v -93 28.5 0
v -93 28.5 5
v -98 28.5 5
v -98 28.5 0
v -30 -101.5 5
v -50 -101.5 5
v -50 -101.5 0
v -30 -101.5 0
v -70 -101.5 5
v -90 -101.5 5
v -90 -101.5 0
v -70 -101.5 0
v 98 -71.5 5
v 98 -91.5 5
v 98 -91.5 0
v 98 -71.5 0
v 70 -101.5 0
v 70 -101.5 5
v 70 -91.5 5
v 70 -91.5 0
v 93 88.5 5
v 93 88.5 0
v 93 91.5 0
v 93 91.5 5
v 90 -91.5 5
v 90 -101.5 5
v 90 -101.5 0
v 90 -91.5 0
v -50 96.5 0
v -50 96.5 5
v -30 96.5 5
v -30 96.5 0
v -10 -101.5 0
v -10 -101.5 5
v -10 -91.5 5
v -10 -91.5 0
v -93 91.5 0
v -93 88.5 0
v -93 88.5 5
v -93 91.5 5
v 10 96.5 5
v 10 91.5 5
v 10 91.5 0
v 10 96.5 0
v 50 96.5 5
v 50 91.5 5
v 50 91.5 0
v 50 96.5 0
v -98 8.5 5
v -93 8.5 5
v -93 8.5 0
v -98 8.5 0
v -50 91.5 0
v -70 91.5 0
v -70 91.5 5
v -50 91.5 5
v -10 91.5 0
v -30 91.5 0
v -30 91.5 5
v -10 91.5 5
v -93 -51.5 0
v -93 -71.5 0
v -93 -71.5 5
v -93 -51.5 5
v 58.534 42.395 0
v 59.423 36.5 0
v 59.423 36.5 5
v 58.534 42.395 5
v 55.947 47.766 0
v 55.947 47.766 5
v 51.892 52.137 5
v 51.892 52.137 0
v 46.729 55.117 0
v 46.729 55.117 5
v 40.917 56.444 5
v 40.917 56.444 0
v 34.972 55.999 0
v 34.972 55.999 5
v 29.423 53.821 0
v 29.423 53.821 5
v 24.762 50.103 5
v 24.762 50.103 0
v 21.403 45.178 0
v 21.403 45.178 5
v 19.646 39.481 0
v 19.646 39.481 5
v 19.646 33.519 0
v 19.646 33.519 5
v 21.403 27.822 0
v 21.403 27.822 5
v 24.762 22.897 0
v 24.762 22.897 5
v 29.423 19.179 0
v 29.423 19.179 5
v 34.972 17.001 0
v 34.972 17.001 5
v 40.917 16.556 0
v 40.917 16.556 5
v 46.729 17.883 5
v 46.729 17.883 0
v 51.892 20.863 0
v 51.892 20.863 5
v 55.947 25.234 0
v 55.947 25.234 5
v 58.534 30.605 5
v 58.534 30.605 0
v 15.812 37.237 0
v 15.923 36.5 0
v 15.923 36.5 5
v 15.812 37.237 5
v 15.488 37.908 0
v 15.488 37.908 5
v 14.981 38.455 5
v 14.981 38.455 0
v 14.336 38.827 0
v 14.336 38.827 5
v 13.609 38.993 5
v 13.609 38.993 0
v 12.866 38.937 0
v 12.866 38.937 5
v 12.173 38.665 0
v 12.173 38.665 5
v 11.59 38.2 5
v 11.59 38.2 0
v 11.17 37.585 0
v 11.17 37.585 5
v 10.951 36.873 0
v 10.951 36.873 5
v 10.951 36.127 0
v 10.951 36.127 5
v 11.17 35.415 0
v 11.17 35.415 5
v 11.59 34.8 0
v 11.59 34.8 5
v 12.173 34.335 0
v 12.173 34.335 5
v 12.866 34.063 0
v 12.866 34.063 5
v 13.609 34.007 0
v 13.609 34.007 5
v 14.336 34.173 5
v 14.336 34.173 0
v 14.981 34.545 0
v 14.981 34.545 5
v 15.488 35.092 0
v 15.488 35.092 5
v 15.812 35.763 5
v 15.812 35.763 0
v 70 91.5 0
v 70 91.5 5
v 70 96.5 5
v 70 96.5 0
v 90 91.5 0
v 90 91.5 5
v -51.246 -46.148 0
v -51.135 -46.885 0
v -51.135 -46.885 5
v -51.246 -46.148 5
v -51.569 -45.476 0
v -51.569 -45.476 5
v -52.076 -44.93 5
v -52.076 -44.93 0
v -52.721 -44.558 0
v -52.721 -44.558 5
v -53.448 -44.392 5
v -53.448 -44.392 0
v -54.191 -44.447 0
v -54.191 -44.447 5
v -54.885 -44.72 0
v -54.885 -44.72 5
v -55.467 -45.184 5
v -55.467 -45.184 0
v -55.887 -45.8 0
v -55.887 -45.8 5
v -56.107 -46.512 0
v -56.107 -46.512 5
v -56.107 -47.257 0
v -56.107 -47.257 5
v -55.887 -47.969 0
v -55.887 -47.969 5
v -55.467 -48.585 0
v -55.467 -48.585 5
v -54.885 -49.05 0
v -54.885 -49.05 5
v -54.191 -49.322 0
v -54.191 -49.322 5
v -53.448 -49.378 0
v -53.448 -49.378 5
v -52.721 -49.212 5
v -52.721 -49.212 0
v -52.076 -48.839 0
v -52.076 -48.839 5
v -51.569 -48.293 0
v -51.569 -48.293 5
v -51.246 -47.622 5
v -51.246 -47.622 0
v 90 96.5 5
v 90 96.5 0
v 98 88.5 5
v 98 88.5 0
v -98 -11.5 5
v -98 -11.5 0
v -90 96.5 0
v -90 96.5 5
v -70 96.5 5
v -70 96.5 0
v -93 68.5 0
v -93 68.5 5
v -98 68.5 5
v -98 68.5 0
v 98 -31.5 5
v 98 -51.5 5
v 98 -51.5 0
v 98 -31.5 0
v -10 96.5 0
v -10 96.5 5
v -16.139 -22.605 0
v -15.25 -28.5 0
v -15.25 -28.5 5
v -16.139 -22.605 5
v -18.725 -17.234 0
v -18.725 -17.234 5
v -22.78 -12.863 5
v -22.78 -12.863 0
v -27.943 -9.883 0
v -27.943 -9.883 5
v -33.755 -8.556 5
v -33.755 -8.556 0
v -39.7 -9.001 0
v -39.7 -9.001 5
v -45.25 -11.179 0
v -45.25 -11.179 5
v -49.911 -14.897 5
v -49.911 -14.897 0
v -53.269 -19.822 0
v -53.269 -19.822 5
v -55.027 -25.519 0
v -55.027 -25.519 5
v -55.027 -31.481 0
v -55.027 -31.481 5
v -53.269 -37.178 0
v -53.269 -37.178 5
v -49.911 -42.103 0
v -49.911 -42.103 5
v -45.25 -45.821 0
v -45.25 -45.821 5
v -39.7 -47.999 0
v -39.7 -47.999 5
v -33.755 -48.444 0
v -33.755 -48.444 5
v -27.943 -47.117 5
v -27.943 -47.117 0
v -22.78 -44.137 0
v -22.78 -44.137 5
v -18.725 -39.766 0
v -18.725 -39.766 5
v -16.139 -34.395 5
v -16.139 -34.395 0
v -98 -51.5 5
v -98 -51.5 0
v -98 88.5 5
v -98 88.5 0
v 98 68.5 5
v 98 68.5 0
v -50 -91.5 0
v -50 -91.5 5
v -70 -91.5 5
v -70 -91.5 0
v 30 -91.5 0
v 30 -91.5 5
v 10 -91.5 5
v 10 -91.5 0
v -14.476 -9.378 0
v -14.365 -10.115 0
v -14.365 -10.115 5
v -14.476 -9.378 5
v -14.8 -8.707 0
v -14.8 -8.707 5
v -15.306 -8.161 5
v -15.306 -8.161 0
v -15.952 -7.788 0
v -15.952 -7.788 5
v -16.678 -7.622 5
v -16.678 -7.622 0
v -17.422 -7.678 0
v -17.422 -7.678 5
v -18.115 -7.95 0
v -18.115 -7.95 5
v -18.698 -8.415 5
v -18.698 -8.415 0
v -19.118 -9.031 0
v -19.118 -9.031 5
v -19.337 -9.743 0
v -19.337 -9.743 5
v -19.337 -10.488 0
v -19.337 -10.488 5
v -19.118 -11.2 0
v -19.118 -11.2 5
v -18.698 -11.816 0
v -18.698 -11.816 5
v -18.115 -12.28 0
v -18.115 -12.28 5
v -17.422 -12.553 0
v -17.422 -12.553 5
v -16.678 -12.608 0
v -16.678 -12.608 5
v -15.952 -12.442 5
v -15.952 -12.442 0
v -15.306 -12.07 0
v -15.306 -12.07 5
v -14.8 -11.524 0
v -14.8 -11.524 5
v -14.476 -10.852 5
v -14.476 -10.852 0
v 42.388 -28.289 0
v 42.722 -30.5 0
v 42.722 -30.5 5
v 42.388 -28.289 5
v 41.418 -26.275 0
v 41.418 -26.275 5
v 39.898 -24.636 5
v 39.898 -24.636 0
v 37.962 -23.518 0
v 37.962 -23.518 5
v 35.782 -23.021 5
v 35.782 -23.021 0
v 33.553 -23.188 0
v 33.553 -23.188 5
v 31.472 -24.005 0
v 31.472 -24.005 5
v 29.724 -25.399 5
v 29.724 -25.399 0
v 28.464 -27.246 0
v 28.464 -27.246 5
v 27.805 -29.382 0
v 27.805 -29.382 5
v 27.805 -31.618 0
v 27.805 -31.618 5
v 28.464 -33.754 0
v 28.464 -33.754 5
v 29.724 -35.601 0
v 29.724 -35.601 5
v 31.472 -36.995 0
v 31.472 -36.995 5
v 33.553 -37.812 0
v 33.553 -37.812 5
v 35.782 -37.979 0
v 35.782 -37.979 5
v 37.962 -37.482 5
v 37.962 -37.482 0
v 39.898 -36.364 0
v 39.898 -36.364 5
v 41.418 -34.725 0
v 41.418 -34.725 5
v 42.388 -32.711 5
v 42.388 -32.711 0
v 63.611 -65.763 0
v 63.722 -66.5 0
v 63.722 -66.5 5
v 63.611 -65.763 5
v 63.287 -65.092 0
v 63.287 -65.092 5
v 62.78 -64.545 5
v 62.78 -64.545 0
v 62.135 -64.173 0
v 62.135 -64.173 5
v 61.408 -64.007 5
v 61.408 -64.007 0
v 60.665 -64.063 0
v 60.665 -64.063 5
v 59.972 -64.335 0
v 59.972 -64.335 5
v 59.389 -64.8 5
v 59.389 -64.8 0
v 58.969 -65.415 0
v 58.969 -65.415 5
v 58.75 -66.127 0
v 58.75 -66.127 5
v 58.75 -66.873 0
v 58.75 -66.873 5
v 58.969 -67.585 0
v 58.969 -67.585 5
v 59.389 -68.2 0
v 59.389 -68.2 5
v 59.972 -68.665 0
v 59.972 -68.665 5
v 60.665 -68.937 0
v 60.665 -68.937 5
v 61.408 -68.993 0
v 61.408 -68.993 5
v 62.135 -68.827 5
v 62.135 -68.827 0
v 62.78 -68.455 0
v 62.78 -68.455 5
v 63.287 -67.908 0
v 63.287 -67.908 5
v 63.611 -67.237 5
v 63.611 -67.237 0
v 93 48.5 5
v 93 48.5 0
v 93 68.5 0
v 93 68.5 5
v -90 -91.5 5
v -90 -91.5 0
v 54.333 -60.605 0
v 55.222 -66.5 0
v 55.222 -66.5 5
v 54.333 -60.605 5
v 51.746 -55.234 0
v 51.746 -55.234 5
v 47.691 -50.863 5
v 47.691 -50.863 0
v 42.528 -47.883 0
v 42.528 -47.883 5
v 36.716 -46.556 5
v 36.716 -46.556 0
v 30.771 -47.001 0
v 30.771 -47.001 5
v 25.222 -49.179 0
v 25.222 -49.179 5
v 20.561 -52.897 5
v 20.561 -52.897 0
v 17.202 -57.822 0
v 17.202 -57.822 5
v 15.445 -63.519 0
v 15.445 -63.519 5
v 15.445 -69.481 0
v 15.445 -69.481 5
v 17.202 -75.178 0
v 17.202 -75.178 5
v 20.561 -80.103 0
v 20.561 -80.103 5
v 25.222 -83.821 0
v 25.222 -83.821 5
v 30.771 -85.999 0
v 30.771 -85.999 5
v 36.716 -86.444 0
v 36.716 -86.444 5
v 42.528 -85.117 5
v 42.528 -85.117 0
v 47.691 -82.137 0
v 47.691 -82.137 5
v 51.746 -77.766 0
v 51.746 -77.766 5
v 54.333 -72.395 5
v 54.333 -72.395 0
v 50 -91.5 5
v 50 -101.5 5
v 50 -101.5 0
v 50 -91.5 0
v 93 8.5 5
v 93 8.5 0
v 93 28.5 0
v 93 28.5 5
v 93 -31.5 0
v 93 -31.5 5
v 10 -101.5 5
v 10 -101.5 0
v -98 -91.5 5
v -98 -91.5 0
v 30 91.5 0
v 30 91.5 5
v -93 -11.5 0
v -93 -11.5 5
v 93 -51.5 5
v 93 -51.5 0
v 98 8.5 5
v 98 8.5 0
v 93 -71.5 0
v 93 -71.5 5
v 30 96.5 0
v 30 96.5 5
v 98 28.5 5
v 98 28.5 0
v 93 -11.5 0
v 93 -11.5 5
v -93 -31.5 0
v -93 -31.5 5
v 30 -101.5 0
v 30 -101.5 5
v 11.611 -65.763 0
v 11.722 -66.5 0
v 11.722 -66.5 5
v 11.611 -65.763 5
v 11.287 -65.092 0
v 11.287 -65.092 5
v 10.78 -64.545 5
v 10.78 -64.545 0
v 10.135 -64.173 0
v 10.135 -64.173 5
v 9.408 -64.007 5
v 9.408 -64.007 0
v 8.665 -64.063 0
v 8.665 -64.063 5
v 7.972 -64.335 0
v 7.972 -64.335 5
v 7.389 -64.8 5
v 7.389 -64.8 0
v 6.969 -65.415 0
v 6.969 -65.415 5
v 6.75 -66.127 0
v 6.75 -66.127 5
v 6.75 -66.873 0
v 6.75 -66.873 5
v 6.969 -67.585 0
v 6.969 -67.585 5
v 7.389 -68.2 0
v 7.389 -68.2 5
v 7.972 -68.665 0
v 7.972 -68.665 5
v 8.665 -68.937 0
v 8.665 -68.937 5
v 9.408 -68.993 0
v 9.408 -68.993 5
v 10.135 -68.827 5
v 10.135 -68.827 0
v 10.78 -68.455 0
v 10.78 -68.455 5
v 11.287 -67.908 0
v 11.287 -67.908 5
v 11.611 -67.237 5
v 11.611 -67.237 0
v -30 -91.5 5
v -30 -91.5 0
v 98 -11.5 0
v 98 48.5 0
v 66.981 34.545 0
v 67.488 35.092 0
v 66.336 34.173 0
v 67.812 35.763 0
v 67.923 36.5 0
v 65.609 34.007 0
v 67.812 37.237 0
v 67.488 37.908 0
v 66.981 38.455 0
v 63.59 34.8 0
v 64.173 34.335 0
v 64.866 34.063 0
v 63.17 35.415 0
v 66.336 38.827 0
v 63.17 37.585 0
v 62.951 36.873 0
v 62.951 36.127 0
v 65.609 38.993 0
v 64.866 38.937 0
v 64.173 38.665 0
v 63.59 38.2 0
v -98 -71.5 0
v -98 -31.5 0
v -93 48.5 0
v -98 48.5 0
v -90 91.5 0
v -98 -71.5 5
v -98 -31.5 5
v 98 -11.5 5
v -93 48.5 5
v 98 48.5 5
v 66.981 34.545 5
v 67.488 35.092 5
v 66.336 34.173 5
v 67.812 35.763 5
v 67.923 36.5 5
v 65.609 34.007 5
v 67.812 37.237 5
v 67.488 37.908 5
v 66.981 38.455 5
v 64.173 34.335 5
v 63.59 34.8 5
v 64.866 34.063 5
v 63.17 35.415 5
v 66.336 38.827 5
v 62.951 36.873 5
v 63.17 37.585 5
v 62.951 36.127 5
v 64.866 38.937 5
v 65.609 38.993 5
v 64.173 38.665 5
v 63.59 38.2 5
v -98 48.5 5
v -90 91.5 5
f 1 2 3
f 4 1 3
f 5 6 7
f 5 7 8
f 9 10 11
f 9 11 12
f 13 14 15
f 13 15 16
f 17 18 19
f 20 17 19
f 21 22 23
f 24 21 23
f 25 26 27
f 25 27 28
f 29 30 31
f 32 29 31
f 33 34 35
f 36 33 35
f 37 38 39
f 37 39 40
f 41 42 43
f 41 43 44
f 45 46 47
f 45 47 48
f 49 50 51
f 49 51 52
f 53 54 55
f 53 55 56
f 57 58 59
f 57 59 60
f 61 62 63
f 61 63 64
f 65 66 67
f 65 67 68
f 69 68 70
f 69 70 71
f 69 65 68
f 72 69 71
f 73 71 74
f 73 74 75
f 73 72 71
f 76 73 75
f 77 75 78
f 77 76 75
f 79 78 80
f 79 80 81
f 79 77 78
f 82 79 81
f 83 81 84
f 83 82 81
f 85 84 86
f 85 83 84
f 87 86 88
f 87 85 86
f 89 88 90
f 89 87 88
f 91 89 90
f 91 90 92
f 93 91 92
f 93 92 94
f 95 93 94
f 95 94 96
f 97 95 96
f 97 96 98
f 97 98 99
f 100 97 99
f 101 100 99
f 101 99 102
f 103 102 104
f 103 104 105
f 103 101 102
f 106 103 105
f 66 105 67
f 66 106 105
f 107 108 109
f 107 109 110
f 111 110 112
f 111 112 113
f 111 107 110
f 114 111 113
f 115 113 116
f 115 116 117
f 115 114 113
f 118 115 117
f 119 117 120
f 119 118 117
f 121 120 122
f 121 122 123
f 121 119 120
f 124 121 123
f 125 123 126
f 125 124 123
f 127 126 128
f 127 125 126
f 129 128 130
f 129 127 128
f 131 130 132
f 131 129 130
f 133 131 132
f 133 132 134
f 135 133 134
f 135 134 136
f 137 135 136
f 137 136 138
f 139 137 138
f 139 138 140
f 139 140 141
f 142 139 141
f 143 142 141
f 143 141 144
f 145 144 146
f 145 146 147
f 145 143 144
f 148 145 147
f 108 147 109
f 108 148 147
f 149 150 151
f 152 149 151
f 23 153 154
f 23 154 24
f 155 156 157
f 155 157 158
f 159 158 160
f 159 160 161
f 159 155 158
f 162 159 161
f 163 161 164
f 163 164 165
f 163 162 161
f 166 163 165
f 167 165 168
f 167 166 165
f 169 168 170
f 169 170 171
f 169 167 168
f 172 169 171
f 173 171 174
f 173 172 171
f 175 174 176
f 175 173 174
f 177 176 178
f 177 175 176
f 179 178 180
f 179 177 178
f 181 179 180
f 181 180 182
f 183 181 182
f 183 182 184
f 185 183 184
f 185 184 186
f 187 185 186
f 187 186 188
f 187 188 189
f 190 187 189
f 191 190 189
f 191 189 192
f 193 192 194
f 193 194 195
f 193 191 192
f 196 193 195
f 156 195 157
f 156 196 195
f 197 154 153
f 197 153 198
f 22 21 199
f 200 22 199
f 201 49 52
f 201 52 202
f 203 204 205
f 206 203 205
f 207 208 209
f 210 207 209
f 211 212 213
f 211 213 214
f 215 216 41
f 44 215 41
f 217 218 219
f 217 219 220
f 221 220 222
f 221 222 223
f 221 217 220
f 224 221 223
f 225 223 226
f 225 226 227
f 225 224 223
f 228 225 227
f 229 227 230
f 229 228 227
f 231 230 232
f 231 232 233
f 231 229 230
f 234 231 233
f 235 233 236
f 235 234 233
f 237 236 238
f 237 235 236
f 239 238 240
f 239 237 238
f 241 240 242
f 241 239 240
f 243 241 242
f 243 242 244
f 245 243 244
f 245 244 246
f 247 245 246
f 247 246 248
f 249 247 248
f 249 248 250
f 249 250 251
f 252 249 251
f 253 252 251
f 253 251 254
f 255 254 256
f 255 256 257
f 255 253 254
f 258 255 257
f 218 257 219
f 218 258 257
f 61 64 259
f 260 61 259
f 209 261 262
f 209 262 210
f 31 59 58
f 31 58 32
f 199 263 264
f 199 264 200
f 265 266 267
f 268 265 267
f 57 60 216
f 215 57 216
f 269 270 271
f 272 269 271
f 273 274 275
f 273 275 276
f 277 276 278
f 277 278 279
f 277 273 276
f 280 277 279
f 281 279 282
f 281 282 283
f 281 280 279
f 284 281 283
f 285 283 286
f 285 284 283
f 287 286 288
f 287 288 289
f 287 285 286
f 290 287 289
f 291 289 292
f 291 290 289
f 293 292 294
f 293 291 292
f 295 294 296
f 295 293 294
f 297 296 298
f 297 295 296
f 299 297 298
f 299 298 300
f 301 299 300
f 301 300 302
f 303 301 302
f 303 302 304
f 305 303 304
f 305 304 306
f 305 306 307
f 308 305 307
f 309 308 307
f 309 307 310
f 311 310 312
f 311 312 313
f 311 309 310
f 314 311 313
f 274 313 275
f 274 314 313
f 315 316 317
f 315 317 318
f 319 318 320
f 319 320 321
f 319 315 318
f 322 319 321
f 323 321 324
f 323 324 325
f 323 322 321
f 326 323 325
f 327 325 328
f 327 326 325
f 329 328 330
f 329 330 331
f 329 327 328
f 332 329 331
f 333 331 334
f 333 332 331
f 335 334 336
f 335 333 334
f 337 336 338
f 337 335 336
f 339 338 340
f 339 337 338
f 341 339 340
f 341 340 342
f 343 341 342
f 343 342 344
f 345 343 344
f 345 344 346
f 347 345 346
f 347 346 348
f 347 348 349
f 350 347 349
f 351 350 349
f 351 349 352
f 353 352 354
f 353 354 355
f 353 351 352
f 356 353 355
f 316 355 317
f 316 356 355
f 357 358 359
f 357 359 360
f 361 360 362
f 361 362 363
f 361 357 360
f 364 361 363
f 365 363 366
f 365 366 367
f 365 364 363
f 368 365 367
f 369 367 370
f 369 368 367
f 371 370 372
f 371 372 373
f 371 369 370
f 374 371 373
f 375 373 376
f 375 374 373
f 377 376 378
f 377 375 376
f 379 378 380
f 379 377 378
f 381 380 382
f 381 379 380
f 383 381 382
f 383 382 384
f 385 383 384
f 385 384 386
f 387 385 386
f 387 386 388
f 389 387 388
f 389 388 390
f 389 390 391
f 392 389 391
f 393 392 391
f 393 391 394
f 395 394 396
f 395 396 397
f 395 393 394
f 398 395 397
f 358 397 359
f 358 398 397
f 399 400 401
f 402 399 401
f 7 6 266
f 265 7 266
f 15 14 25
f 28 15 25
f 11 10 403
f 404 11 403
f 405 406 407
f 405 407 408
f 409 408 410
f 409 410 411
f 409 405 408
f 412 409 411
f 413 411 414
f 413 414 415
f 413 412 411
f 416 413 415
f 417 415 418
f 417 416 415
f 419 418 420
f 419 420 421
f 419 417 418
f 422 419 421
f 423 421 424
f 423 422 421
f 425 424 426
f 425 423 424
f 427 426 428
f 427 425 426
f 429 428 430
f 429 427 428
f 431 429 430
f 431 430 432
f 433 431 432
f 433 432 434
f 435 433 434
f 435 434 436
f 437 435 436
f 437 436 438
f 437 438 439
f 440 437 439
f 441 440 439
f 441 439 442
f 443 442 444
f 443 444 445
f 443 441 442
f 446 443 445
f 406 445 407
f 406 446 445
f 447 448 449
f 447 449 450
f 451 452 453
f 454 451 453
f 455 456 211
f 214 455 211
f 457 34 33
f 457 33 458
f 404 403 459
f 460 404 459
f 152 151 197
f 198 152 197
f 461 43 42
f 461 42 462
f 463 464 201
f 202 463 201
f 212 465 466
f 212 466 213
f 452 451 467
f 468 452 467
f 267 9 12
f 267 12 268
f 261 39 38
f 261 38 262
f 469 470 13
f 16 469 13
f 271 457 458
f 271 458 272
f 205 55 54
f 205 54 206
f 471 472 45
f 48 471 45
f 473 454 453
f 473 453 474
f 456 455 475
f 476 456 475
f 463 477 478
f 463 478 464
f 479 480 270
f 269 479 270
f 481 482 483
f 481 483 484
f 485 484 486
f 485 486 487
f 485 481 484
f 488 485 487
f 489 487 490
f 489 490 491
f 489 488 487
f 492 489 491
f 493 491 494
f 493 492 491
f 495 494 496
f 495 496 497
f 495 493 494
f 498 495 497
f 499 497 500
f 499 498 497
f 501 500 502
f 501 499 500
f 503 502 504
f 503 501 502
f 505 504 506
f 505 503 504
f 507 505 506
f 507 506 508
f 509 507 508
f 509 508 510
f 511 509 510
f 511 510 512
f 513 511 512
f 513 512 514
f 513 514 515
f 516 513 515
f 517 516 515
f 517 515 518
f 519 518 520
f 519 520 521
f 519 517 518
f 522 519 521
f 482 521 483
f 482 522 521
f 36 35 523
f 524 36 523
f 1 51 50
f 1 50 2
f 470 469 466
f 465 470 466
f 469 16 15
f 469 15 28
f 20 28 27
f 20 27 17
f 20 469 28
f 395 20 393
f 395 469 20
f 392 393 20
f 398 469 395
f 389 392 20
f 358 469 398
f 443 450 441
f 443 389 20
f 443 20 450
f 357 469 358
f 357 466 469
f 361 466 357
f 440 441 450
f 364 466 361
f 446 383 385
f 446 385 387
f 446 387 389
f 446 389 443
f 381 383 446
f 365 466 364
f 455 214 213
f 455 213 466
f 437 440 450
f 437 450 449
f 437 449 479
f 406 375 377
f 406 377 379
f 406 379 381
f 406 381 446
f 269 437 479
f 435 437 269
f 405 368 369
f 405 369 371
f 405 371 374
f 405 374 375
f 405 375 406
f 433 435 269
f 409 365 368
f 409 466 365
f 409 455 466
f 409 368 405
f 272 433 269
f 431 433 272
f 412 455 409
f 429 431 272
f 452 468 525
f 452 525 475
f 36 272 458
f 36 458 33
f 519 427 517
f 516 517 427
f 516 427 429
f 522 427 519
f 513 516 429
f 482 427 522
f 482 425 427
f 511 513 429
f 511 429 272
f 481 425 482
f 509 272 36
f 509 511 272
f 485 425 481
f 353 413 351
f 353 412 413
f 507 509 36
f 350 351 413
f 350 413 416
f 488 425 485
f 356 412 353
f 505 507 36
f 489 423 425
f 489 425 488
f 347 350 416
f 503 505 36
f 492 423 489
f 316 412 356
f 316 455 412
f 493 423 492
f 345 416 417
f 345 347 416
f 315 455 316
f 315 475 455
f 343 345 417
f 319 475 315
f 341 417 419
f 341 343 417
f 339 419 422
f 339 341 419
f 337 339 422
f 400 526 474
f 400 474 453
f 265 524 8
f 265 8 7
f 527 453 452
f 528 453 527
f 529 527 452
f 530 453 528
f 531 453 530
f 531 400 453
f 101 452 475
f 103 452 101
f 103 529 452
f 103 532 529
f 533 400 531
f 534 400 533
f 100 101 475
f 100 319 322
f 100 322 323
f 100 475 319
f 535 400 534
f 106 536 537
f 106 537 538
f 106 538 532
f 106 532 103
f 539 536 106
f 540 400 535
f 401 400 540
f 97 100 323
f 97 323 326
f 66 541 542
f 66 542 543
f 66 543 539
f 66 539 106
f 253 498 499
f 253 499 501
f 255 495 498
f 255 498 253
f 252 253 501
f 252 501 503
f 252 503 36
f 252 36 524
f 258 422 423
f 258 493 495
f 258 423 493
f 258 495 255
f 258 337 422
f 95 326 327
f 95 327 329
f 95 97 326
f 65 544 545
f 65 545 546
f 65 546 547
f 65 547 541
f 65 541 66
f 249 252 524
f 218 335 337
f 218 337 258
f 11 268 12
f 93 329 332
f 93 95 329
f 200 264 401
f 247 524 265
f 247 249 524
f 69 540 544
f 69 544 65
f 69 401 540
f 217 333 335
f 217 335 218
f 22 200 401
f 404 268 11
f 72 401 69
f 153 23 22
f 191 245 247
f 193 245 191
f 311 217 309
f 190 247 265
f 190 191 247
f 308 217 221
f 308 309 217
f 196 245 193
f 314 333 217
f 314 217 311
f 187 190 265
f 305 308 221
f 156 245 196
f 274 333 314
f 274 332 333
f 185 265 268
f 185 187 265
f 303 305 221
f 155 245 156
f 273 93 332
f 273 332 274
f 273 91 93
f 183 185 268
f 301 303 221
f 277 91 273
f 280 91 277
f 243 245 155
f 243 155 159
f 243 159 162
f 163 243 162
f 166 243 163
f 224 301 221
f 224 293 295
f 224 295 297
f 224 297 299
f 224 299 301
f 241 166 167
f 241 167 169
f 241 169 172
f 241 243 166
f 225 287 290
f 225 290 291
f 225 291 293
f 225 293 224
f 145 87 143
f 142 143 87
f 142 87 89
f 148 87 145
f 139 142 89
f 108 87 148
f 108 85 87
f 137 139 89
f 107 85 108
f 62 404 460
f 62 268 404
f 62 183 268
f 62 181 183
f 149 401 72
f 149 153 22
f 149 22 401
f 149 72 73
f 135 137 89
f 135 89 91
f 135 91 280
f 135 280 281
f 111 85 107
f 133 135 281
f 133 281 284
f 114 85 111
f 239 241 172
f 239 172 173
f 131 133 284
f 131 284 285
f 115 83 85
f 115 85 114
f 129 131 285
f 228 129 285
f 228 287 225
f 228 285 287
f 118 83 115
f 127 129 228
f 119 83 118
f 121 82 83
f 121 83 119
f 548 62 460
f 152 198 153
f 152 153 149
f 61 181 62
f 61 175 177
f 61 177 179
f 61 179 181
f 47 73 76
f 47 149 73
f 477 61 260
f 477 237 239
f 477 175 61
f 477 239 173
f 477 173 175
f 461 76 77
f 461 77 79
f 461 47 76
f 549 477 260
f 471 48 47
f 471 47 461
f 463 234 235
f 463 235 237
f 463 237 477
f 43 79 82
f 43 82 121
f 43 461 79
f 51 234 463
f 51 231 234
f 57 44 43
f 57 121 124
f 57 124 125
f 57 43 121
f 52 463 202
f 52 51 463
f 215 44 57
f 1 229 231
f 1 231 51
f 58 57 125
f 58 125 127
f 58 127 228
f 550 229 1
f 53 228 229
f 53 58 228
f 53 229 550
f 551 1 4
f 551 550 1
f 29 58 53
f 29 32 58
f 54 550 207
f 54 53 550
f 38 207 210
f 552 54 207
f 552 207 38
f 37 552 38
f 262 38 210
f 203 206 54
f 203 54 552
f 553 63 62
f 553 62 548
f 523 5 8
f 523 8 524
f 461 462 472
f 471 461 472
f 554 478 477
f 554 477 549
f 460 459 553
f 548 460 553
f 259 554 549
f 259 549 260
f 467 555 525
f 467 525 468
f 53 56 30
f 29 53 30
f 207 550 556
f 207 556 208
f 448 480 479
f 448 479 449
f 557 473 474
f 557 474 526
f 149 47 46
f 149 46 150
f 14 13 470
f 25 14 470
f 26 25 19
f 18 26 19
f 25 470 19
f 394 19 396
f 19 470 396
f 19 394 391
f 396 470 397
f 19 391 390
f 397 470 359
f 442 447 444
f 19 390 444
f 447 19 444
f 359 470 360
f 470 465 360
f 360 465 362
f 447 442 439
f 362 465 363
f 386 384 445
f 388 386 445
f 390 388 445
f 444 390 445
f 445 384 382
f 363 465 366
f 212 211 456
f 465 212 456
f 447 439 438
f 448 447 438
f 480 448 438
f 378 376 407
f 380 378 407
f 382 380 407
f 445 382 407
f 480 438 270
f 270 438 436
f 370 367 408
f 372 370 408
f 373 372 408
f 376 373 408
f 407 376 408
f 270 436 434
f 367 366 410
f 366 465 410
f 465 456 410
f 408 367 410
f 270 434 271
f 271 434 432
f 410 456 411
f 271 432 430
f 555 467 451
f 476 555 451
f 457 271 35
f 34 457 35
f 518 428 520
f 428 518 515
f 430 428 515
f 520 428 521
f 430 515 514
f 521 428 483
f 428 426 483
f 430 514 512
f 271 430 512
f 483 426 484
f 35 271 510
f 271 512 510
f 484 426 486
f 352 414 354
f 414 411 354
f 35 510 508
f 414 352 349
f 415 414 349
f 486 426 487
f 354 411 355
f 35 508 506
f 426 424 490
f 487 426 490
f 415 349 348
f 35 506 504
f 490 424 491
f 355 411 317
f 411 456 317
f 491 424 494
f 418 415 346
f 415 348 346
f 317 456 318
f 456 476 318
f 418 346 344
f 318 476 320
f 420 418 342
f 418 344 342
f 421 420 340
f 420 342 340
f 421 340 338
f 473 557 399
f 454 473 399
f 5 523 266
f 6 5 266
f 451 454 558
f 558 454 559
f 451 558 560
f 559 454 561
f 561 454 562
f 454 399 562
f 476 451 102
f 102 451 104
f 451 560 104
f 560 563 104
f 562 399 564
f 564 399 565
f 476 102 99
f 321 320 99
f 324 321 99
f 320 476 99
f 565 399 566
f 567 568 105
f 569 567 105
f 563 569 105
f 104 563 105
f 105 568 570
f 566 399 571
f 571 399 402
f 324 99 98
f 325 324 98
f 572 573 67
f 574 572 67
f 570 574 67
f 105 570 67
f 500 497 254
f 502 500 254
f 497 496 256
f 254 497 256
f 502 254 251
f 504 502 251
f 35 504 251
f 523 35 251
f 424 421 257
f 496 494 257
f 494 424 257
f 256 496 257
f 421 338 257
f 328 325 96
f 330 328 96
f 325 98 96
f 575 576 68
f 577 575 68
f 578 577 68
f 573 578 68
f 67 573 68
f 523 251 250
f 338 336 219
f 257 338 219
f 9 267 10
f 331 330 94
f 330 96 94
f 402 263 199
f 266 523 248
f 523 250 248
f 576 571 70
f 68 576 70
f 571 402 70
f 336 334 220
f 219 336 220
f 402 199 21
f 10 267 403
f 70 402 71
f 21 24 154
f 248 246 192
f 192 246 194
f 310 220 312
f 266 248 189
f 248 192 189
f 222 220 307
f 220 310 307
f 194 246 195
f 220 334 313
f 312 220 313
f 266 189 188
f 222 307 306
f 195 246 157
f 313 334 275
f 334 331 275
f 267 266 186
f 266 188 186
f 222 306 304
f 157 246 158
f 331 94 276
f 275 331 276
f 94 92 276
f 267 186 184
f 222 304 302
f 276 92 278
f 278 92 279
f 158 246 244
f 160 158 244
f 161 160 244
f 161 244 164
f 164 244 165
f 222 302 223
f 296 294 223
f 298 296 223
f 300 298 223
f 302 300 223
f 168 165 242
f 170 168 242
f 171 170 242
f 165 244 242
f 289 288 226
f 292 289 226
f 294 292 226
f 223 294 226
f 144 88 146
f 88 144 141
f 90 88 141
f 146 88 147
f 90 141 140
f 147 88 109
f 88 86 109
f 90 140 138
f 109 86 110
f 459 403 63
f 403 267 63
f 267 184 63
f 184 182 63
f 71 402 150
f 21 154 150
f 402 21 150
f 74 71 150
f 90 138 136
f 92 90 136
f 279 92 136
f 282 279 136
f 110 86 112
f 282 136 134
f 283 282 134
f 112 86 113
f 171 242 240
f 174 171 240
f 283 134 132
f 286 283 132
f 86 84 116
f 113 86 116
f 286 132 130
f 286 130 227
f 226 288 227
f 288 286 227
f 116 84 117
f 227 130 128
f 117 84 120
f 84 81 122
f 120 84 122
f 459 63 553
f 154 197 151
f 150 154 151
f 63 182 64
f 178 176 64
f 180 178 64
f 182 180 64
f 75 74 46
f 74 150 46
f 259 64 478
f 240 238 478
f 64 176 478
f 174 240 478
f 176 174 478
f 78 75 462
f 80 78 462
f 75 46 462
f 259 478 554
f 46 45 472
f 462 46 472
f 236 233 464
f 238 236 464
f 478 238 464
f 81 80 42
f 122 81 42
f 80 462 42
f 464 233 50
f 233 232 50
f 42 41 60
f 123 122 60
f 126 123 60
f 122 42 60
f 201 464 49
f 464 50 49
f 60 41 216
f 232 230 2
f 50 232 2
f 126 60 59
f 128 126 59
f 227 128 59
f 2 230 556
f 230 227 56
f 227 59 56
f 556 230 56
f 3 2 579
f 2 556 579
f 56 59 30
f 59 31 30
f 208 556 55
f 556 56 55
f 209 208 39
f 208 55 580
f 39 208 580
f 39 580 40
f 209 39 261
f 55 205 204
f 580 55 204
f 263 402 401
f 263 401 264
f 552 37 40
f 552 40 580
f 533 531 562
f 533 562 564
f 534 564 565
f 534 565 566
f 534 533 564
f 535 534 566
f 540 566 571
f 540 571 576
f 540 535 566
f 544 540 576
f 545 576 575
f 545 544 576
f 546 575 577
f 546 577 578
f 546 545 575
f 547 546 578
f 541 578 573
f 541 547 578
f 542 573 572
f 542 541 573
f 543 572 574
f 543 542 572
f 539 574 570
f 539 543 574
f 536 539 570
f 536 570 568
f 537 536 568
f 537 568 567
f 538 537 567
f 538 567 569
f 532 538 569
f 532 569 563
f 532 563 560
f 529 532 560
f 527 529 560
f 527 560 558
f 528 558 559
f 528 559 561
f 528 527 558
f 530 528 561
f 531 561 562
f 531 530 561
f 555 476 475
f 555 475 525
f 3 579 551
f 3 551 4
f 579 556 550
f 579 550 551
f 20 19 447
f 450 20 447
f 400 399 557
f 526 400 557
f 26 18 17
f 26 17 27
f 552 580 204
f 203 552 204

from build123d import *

# Parameters (mm, degrees)
SKETCH_1_W                       = 186
SKETCH_1_H                       = 183
SKETCH_1_R                       = 7.5
SKETCH_1_R_2                     = 20
SKETCH_1_R_3                     = 2.5
EXTRUDE_1_DEPTH                  = 5
SKETCH_2_W                       = 5
SKETCH_2_H                       = 20
EXTRUDE_2_DEPTH                  = 5
PATTERN_LINEAR_2_COUNT           = 5
PATTERN_LINEAR_2_PITCH           = 40
MIRROR_2_COPY_1_SKETCH_W         = 5
MIRROR_2_COPY_1_SKETCH_H         = 20
MIRROR_2_COPY_1_DEPTH            = 5
MIRROR_2_COPY_2_SKETCH_W         = 5
MIRROR_2_COPY_2_SKETCH_H         = 20
MIRROR_2_COPY_2_DEPTH            = 5
MIRROR_2_COPY_3_SKETCH_W         = 5
MIRROR_2_COPY_3_SKETCH_H         = 20
MIRROR_2_COPY_3_DEPTH            = 5
MIRROR_2_COPY_4_SKETCH_W         = 5
MIRROR_2_COPY_4_SKETCH_H         = 20
MIRROR_2_COPY_4_DEPTH            = 5
SKETCH_3_W                       = 20
SKETCH_3_H                       = 5
EXTRUDE_3_DEPTH                  = 5
PATTERN_LINEAR_3_COUNT           = 3
PATTERN_LINEAR_3_PITCH           = 40
PATTERN_LINEAR_4_COUNT           = 3
PATTERN_LINEAR_4_PITCH           = 40
SKETCH_4_W                       = 20
SKETCH_4_H                       = 10
EXTRUDE_4_DEPTH                  = 5
PATTERN_LINEAR_5_COUNT           = 3
PATTERN_LINEAR_5_PITCH           = 40
PATTERN_LINEAR_6_COPY_1_SKETCH_W = 20
PATTERN_LINEAR_6_COPY_1_SKETCH_H = 10
PATTERN_LINEAR_6_COPY_1_DEPTH    = 5
PATTERN_LINEAR_6_COPY_2_SKETCH_W = 20
PATTERN_LINEAR_6_COPY_2_SKETCH_H = 10
PATTERN_LINEAR_6_COPY_2_DEPTH    = 5
PATTERN_LINEAR_6_COPY_3_SKETCH_W = 20
PATTERN_LINEAR_6_COPY_3_SKETCH_H = 10
PATTERN_LINEAR_6_COPY_3_DEPTH    = 5
PATTERN_LINEAR_6_COPY_4_SKETCH_W = 20
PATTERN_LINEAR_6_COPY_4_SKETCH_H = 10
PATTERN_LINEAR_6_COPY_4_DEPTH    = 5
PATTERN_LINEAR_6_COPY_5_SKETCH_W = 20
PATTERN_LINEAR_6_COPY_5_SKETCH_H = 10
PATTERN_LINEAR_6_COPY_5_DEPTH    = 5
PATTERN_LINEAR_6_COPY_6_SKETCH_W = 20
PATTERN_LINEAR_6_COPY_6_SKETCH_H = 10
PATTERN_LINEAR_6_COPY_6_DEPTH    = 5


with BuildPart() as part:
    # 스케치1 → 보스-돌출1 (new body)
    with BuildSketch(Plane.XY):
        Rectangle(SKETCH_1_W, SKETCH_1_H)
        with Locations((35.221625496, -30.5)):
            Circle(SKETCH_1_R, mode=Mode.SUBTRACT)
        with Locations((-35.25, -28.5)):
            Circle(SKETCH_1_R_2, mode=Mode.SUBTRACT)
        with Locations((35.221625496, -66.5)):
            Circle(SKETCH_1_R_2, mode=Mode.SUBTRACT)
        with Locations((39.42261881, 36.5)):
            Circle(SKETCH_1_R_2, mode=Mode.SUBTRACT)
        with Locations((-53.634776311, -46.884776311)):
            Circle(SKETCH_1_R_3, mode=Mode.SUBTRACT)
        with Locations((-16.865223689, -10.115223689)):
            Circle(SKETCH_1_R_3, mode=Mode.SUBTRACT)
        with Locations((65.42261881, 36.5)):
            Circle(SKETCH_1_R_3, mode=Mode.SUBTRACT)
        with Locations((13.42261881, 36.5)):
            Circle(SKETCH_1_R_3, mode=Mode.SUBTRACT)
        with Locations((9.221625496, -66.5)):
            Circle(SKETCH_1_R_3, mode=Mode.SUBTRACT)
        with Locations((61.221625496, -66.5)):
            Circle(SKETCH_1_R_3, mode=Mode.SUBTRACT)
    extrude(amount=EXTRUDE_1_DEPTH)

    # 스케치2 → 보스-돌출2 (add)
    with BuildSketch(Plane.XY.offset(5)):
        with Locations((95.5, -81.5)):
            Rectangle(SKETCH_2_W, SKETCH_2_H)
    extrude_2 = extrude(amount=-EXTRUDE_2_DEPTH)

    # 선형 패턴2: 보스-돌출2 ×5
    with Locations(*[(0, i * PATTERN_LINEAR_2_PITCH, 0) for i in range(1, PATTERN_LINEAR_2_COUNT)]):
        add(extrude_2)

    # 대칭 복사2: 보스-돌출2 across plane
    add(extrude_2.mirror(Plane(origin=(0, 0, 0), x_dir=(0, 0, 1), z_dir=(1, 0, 0))))

    # 대칭 복사2 copy 1 sketch → 대칭 복사2 copy 1 (add)
    with BuildSketch(Plane(origin=(0, 40, 5), x_dir=(-1, 0, 0), z_dir=(0, 0, 1))):
        with Locations((95.5, 81.5)):
            Rectangle(MIRROR_2_COPY_1_SKETCH_W, MIRROR_2_COPY_1_SKETCH_H)
    extrude(amount=-MIRROR_2_COPY_1_DEPTH)

    # 대칭 복사2 copy 2 sketch → 대칭 복사2 copy 2 (add)
    with BuildSketch(Plane(origin=(0, 80, 5), x_dir=(-1, 0, 0), z_dir=(0, 0, 1))):
        with Locations((95.5, 81.5)):
            Rectangle(MIRROR_2_COPY_2_SKETCH_W, MIRROR_2_COPY_2_SKETCH_H)
    extrude(amount=-MIRROR_2_COPY_2_DEPTH)

    # 대칭 복사2 copy 3 sketch → 대칭 복사2 copy 3 (add)
    with BuildSketch(Plane(origin=(0, 120, 5), x_dir=(-1, 0, 0), z_dir=(0, 0, 1))):
        with Locations((95.5, 81.5)):
            Rectangle(MIRROR_2_COPY_3_SKETCH_W, MIRROR_2_COPY_3_SKETCH_H)
    extrude(amount=-MIRROR_2_COPY_3_DEPTH)

    # 대칭 복사2 copy 4 sketch → 대칭 복사2 copy 4 (add)
    with BuildSketch(Plane(origin=(0, 160, 5), x_dir=(-1, 0, 0), z_dir=(0, 0, 1))):
        with Locations((95.5, 81.5)):
            Rectangle(MIRROR_2_COPY_4_SKETCH_W, MIRROR_2_COPY_4_SKETCH_H)
    extrude(amount=-MIRROR_2_COPY_4_DEPTH)

    # 스케치3 → 보스-돌출3 (add)
    with BuildSketch(Plane.XY.offset(5)):
        with Locations((0, 94)):
            Rectangle(SKETCH_3_W, SKETCH_3_H)
    extrude_3 = extrude(amount=-EXTRUDE_3_DEPTH)

    # 선형 패턴3: 보스-돌출3 ×3
    with Locations(*[(i * PATTERN_LINEAR_3_PITCH, 0, 0) for i in range(1, PATTERN_LINEAR_3_COUNT)]):
        add(extrude_3)

    # 선형 패턴4: 보스-돌출3 ×3
    with Locations(*[(-i * PATTERN_LINEAR_4_PITCH, 0, 0) for i in range(1, PATTERN_LINEAR_4_COUNT)]):
        add(extrude_3)

    # 스케치4 → 보스-돌출4 (add)
    with BuildSketch(Plane.XY.offset(5)):
        with Locations((0, -96.5)):
            Rectangle(SKETCH_4_W, SKETCH_4_H)
    extrude_4 = extrude(amount=-EXTRUDE_4_DEPTH)

    # 선형 패턴5: 보스-돌출4 ×3
    with Locations(*[(i * PATTERN_LINEAR_5_PITCH, 0, 0) for i in range(1, PATTERN_LINEAR_5_COUNT)]):
        add(extrude_4)

    # 선형 패턴6 copy 1 sketch → 선형 패턴6 copy 1 (add)
    with BuildSketch(Plane.XY.offset(5)):
        with Locations((0, -96.5)):
            Rectangle(PATTERN_LINEAR_6_COPY_1_SKETCH_W, PATTERN_LINEAR_6_COPY_1_SKETCH_H)
    extrude(amount=-PATTERN_LINEAR_6_COPY_1_DEPTH)

    # 선형 패턴6 copy 2 sketch → 선형 패턴6 copy 2 (add)
    with BuildSketch(Plane(origin=(-40, 0, 5), x_dir=(1, 0, 0), z_dir=(0, 0, 1))):
        with Locations((0, -96.5)):
            Rectangle(PATTERN_LINEAR_6_COPY_2_SKETCH_W, PATTERN_LINEAR_6_COPY_2_SKETCH_H)
    extrude(amount=-PATTERN_LINEAR_6_COPY_2_DEPTH)

    # 선형 패턴6 copy 3 sketch → 선형 패턴6 copy 3 (add)
    with BuildSketch(Plane(origin=(40, 0, 5), x_dir=(1, 0, 0), z_dir=(0, 0, 1))):
        with Locations((0, -96.5)):
            Rectangle(PATTERN_LINEAR_6_COPY_3_SKETCH_W, PATTERN_LINEAR_6_COPY_3_SKETCH_H)
    extrude(amount=-PATTERN_LINEAR_6_COPY_3_DEPTH)

    # 선형 패턴6 copy 4 sketch → 선형 패턴6 copy 4 (add)
    with BuildSketch(Plane.XY.offset(5)):
        with Locations((0, -96.5)):
            Rectangle(PATTERN_LINEAR_6_COPY_4_SKETCH_W, PATTERN_LINEAR_6_COPY_4_SKETCH_H)
    extrude(amount=-PATTERN_LINEAR_6_COPY_4_DEPTH)

    # 선형 패턴6 copy 5 sketch → 선형 패턴6 copy 5 (add)
    with BuildSketch(Plane(origin=(-40, 0, 5), x_dir=(1, 0, 0), z_dir=(0, 0, 1))):
        with Locations((0, -96.5)):
            Rectangle(PATTERN_LINEAR_6_COPY_5_SKETCH_W, PATTERN_LINEAR_6_COPY_5_SKETCH_H)
    extrude(amount=-PATTERN_LINEAR_6_COPY_5_DEPTH)

    # 선형 패턴6 copy 6 sketch → 선형 패턴6 copy 6 (add)
    with BuildSketch(Plane(origin=(-80, 0, 5), x_dir=(1, 0, 0), z_dir=(0, 0, 1))):
        with Locations((0, -96.5)):
            Rectangle(PATTERN_LINEAR_6_COPY_6_SKETCH_W, PATTERN_LINEAR_6_COPY_6_SKETCH_H)
    extrude(amount=-PATTERN_LINEAR_6_COPY_6_DEPTH)


solid = part.part
